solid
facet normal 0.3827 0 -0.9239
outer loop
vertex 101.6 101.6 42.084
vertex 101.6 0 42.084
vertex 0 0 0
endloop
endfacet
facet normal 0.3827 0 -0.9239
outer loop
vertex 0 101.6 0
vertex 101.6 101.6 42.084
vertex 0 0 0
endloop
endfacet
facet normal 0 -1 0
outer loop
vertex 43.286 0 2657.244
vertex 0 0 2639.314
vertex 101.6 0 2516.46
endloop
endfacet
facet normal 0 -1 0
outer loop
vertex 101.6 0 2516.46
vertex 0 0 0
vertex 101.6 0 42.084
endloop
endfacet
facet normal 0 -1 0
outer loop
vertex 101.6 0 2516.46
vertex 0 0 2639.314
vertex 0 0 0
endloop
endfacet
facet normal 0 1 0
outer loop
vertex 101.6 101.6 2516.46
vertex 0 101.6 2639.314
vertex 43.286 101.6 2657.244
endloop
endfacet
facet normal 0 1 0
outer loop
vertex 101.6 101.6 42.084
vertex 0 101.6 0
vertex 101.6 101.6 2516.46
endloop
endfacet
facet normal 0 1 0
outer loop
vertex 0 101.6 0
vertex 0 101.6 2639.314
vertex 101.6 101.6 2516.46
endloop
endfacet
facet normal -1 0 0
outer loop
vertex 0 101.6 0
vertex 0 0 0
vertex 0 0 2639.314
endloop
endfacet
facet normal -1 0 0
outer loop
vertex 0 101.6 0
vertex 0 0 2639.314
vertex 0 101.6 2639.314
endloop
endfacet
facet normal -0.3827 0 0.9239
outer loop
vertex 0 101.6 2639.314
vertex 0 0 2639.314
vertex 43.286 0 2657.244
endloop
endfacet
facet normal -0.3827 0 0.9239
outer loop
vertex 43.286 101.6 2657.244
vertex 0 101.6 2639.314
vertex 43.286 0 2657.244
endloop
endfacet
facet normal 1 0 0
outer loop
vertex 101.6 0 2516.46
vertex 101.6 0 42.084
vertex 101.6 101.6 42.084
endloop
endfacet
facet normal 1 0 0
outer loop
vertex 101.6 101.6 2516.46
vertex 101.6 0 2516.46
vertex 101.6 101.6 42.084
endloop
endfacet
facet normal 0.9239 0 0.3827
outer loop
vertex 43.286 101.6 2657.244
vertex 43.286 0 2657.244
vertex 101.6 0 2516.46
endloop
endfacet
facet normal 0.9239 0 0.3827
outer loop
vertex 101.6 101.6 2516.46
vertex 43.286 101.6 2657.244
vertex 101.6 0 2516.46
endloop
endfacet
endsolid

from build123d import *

# Parameters (mm, degrees)
F0_W     = 101.6
F0_H     = 101.6
F1_DEPTH = 3048
F3_DEPTH = 101.601
F5_DEPTH = 101.601
F7_DEPTH = 101.601


with BuildPart() as f1:
    # F0 (on Top) → F1 (new body)
    with BuildSketch(Plane.XY):
        with Locations((50.8, 50.8)):
            Rectangle(F0_W, F0_H)
    extrude(amount=F1_DEPTH)

    # F2 (on Front) → F3 (cut, through all)
    with BuildSketch(Plane.XZ):
        Polygon((101.6, 42.0840979371), (0, 0), (101.6, 0), align=None)
    extrude(amount=-F3_DEPTH, mode=Mode.SUBTRACT)

    # F4 (on face) → F5 (cut, through all)
    with BuildSketch(Plane.XZ):
        Polygon((0, 3048), (0, 2639.314), (101.6, 2681.3980979371), (101.6, 3048), align=None)
    extrude(amount=-F5_DEPTH, mode=Mode.SUBTRACT)

    # F6 (on face) → F7 (cut, through all)
    with BuildSketch(Plane.XZ):
        Polygon((101.6, 2681.3980979371), (43.2856477874, 2657.2435023697), (101.6, 2516.460202377), align=None)
    extrude(amount=-F7_DEPTH, mode=Mode.SUBTRACT)


solid = f1.part
